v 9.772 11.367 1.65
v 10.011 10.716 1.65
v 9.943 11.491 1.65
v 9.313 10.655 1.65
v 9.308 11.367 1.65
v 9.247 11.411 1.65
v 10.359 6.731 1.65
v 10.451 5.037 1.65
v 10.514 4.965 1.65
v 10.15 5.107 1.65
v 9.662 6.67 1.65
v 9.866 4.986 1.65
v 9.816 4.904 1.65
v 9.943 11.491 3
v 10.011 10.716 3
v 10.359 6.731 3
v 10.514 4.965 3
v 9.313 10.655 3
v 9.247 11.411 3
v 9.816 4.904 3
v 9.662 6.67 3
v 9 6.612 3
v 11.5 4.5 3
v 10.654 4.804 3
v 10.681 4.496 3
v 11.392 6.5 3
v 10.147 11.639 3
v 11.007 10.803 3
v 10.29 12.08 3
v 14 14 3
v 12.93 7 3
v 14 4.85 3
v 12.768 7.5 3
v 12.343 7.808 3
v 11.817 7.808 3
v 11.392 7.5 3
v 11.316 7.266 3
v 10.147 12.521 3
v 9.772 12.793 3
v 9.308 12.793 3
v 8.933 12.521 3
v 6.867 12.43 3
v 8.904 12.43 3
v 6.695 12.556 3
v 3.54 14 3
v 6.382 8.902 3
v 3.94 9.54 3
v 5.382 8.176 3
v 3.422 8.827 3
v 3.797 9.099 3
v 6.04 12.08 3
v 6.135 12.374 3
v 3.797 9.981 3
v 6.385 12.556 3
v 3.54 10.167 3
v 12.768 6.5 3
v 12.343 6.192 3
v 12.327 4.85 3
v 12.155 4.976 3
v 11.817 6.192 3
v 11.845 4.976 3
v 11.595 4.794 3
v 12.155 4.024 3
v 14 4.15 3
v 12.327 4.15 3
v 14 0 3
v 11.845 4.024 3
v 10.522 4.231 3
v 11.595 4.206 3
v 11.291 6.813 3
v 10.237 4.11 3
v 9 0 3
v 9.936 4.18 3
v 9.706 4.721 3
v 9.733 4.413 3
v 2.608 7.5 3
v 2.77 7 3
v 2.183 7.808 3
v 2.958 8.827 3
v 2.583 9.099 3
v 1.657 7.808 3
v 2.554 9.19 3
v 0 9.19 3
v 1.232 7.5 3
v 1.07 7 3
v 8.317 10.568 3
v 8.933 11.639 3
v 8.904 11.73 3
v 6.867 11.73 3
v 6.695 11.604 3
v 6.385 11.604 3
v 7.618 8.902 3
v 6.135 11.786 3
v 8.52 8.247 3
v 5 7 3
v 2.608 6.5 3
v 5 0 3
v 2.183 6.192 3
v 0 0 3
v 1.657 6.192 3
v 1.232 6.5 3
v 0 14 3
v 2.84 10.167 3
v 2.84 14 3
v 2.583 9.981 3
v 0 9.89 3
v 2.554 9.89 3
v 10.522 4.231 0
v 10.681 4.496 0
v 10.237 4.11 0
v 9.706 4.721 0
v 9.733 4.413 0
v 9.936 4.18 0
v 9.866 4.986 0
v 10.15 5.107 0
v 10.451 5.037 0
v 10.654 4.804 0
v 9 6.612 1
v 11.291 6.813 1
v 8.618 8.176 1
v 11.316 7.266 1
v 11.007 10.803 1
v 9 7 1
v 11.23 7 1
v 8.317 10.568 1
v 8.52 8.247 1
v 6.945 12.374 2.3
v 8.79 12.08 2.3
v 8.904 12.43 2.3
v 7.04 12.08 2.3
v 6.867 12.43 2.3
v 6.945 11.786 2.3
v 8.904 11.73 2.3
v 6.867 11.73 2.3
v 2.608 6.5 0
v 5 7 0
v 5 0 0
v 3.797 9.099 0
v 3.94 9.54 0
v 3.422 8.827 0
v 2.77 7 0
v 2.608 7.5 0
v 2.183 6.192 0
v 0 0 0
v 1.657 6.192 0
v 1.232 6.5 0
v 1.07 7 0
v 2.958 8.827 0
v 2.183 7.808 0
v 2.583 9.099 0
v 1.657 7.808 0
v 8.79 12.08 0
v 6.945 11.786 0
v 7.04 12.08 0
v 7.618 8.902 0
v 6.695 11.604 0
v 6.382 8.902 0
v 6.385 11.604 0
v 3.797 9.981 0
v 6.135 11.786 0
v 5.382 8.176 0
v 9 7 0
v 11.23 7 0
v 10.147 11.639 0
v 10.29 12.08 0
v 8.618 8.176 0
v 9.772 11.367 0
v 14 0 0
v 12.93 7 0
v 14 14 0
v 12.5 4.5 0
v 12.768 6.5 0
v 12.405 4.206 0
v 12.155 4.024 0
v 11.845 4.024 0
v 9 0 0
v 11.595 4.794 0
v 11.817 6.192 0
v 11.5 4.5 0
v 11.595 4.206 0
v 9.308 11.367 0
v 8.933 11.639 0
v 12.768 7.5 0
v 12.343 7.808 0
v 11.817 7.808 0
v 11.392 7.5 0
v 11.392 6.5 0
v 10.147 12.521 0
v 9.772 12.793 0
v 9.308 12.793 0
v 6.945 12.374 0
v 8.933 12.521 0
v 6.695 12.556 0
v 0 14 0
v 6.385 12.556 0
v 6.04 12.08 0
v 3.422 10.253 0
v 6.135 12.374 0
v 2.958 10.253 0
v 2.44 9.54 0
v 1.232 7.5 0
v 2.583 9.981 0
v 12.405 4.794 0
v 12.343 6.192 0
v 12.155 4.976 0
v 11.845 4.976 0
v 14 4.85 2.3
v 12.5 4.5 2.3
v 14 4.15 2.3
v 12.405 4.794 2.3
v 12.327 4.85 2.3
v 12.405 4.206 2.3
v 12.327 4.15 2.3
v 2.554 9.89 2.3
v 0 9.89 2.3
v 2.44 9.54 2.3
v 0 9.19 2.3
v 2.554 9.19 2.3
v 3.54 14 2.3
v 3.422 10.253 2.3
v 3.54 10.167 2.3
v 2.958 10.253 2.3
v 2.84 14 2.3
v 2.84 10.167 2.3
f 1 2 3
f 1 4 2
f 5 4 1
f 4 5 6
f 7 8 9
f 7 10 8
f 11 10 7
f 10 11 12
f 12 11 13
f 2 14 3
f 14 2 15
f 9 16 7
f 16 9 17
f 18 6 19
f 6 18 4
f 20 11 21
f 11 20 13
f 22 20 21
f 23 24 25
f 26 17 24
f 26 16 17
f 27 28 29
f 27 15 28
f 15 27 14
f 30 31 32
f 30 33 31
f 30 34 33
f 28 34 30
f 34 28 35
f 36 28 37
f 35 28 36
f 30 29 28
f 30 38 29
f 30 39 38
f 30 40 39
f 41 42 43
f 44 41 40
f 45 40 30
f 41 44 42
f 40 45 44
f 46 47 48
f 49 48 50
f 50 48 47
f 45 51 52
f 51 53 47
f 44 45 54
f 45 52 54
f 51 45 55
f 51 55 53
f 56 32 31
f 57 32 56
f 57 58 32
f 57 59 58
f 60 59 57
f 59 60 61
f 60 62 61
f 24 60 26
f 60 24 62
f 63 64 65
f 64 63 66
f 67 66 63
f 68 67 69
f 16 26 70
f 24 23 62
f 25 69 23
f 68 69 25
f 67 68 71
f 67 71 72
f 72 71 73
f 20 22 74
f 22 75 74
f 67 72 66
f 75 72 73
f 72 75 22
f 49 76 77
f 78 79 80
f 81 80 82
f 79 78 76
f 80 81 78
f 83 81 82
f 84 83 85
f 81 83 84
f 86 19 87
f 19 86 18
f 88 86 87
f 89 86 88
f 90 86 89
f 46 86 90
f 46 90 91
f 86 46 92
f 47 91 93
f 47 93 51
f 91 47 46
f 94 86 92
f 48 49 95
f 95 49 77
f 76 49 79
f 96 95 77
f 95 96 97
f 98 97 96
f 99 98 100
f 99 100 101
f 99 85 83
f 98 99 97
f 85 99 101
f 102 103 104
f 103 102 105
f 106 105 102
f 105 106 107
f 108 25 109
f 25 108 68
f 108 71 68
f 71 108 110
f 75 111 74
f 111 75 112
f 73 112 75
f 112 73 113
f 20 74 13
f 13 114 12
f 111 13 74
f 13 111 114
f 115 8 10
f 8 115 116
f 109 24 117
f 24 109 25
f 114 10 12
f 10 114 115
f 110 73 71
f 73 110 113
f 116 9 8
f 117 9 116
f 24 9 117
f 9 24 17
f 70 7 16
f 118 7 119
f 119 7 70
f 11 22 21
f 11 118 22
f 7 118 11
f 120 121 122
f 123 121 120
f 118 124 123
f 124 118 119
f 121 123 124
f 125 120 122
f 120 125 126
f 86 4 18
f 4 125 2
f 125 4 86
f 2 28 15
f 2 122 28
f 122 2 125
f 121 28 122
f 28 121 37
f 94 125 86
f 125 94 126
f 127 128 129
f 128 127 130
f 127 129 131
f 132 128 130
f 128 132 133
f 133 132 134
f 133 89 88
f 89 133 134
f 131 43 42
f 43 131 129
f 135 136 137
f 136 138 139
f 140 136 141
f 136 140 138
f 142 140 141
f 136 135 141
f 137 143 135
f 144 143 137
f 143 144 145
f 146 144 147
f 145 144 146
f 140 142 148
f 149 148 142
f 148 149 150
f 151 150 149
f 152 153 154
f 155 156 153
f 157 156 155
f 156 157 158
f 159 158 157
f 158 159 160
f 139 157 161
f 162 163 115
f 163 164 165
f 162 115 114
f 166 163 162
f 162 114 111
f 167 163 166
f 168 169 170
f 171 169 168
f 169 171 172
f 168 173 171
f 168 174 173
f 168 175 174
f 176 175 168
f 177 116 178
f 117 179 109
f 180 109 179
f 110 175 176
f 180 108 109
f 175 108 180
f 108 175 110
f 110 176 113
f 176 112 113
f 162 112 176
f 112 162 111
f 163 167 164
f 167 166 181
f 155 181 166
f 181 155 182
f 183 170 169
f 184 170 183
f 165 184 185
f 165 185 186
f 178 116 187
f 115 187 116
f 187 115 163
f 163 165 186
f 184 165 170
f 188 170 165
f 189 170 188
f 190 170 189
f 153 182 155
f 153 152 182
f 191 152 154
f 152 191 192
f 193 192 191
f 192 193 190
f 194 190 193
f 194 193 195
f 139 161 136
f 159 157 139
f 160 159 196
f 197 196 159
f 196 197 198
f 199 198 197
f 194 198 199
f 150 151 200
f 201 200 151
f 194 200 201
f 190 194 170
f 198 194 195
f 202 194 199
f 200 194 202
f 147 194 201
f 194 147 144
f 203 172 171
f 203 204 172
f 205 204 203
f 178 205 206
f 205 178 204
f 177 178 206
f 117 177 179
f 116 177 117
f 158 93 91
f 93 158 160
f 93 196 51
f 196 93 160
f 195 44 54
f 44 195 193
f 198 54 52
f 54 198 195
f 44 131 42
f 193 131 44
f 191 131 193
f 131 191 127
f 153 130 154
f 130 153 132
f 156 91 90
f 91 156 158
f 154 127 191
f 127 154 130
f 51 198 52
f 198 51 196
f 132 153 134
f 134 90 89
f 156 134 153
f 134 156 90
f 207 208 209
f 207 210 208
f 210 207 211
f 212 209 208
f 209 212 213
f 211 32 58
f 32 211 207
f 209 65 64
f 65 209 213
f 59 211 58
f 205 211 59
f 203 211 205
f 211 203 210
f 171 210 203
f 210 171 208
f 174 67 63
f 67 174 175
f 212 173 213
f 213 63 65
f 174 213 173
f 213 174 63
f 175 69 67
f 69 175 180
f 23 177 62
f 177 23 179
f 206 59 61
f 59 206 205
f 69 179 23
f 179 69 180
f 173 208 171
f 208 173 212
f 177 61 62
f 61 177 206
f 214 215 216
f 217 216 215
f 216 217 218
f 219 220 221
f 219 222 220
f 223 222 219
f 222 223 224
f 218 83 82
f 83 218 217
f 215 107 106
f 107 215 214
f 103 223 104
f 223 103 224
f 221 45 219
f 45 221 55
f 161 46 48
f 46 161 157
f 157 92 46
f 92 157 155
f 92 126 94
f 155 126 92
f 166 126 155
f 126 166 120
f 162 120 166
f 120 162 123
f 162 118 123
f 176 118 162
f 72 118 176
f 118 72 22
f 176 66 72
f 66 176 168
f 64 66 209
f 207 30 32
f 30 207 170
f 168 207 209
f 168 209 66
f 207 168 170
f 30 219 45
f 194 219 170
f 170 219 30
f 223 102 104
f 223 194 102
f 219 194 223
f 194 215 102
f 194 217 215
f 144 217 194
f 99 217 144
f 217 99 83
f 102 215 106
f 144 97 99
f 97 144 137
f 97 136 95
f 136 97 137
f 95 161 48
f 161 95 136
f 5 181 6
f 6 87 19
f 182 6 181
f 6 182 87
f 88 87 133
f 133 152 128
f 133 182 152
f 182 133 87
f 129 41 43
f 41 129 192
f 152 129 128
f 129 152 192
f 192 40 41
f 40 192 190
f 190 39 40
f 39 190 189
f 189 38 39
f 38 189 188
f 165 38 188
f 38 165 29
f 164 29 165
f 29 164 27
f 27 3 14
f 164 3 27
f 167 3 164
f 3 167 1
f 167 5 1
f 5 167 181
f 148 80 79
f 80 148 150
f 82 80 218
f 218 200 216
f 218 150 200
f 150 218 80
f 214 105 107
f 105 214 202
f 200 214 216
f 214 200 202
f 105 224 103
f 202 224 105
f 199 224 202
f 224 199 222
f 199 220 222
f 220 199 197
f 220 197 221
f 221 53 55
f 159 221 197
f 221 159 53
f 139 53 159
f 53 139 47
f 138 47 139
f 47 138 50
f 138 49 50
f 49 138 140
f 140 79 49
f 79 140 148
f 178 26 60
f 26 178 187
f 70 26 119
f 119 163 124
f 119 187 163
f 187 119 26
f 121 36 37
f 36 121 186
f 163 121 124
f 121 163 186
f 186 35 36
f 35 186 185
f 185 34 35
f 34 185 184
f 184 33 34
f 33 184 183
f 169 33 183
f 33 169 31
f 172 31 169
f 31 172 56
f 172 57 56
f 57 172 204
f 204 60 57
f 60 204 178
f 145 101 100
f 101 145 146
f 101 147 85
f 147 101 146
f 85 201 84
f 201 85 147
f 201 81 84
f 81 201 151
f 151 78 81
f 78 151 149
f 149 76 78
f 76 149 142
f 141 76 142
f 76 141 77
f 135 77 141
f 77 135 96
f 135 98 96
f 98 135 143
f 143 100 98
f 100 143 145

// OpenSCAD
module Pick() {
	difference() {
		cube([20, 20, 5]);
		translate([0, 1.5, 0]) {
			cube([20, 17, 3.5]);
			translate([0, 1.5, 0]) {
				cube([20, 14, 5]);
			}
		}
	}

}

module Circle(dia) { circle(d=dia, $fn=10);
}
module Circle1() {
	Circle(4);
}
module Circle2() {
	Circle(1.5);
}
module Circle3() {
	Circle(1.7);
}
module BaseHoles() {
	Circle1();
	translate([-3.81, 2.54, 0]) {
		Circle2();
	}
	translate([2.54, 5.08, 0]) {
		Circle2();
	}
	translate([5.08, 0, 0]) {
		Circle3();
	}
	translate([-5.08, 0, 0]) {
		Circle3();
	}
}
module SwitchBase () {
	thickness = 3;
	wire_thickness = 0.7;
	diode_length = 4;
	diode_thickness = 2;

	// TODO: replace Path and Path2 to Path3.
	module Path(length) {
		cube([length, wire_thickness, wire_thickness]);
	}
	module Path2(length) {
		cube([length, wire_thickness, wire_thickness], true);
		children();
	}
	module Path3(length) {
		translate([length/2, 0, wire_thickness/2]) {
			cube([length, wire_thickness, wire_thickness], true);
		}
		children();
	}
	module DiodeWirePath(length) {
		translate([length/2, 0, diode_thickness/2]) {
			Path2(length);
		}
		translate([length/2, 0, wire_thickness/2]) {
			Path2(length);
		}
		children();
	}
	module Diode() {
		translate([diode_length/2 + 1.4, 0, diode_thickness/2]){
			cube([diode_length, diode_thickness + 0.7, diode_thickness], true);
		}
	}

	difference() {
		linear_extrude(thickness) {
			difference() {
				square(14, false);
				translate([7, 7, 0]) {
					BaseHoles();
					translate([-2, -7, 0]) {
						square([4, 7]);
					}
				}
			}
		}

		translate([7, 7, 0]) {
			translate([0, 0, thickness]) {
				mirror([0, 0, 1]) {
					translate([2.54, 5.08, 0]) {
						rotate([0, 0, -85]) {
							DiodeWirePath(7.5) {
								translate([7.5, 0, 0]) linear_extrude(5) Circle(1);
							};
							Diode();
						}
						rotate([0, 0, 180]) Path3(3) {
							translate([3, 0, 0]) linear_extrude(3) Circle(1);
						}
							
					}

					translate([5, -2.5, 0]) Path3(10) linear_extrude(5) Circle(1);

					translate([-3.81, 2.54 - wire_thickness/2, 0]) {
						mirror([1, 0, 0])
							Path(5);
					}

					translate([-3.81 - wire_thickness/2, 2.54, 0]) {
						rotate([0, 0, 90]) {
							mirror([0, 1, 0]) {
								Path(5);
							}
						}
					}
				}
			}
		}
	}
}

render() SwitchBase();

// translate([0, 0, 1.5]) {
// 	render() Pick();
// }
// linear_extrude(1.5) {
// 	difference() {
// 		square(20);
// 		translate([3, 3, 0]) {
// 			square(14);
// 		}
// 	}
// 	translate([3, 3, 0])
// 		SwitchBase();
// }
echo(concat([1, 2], [0]));
